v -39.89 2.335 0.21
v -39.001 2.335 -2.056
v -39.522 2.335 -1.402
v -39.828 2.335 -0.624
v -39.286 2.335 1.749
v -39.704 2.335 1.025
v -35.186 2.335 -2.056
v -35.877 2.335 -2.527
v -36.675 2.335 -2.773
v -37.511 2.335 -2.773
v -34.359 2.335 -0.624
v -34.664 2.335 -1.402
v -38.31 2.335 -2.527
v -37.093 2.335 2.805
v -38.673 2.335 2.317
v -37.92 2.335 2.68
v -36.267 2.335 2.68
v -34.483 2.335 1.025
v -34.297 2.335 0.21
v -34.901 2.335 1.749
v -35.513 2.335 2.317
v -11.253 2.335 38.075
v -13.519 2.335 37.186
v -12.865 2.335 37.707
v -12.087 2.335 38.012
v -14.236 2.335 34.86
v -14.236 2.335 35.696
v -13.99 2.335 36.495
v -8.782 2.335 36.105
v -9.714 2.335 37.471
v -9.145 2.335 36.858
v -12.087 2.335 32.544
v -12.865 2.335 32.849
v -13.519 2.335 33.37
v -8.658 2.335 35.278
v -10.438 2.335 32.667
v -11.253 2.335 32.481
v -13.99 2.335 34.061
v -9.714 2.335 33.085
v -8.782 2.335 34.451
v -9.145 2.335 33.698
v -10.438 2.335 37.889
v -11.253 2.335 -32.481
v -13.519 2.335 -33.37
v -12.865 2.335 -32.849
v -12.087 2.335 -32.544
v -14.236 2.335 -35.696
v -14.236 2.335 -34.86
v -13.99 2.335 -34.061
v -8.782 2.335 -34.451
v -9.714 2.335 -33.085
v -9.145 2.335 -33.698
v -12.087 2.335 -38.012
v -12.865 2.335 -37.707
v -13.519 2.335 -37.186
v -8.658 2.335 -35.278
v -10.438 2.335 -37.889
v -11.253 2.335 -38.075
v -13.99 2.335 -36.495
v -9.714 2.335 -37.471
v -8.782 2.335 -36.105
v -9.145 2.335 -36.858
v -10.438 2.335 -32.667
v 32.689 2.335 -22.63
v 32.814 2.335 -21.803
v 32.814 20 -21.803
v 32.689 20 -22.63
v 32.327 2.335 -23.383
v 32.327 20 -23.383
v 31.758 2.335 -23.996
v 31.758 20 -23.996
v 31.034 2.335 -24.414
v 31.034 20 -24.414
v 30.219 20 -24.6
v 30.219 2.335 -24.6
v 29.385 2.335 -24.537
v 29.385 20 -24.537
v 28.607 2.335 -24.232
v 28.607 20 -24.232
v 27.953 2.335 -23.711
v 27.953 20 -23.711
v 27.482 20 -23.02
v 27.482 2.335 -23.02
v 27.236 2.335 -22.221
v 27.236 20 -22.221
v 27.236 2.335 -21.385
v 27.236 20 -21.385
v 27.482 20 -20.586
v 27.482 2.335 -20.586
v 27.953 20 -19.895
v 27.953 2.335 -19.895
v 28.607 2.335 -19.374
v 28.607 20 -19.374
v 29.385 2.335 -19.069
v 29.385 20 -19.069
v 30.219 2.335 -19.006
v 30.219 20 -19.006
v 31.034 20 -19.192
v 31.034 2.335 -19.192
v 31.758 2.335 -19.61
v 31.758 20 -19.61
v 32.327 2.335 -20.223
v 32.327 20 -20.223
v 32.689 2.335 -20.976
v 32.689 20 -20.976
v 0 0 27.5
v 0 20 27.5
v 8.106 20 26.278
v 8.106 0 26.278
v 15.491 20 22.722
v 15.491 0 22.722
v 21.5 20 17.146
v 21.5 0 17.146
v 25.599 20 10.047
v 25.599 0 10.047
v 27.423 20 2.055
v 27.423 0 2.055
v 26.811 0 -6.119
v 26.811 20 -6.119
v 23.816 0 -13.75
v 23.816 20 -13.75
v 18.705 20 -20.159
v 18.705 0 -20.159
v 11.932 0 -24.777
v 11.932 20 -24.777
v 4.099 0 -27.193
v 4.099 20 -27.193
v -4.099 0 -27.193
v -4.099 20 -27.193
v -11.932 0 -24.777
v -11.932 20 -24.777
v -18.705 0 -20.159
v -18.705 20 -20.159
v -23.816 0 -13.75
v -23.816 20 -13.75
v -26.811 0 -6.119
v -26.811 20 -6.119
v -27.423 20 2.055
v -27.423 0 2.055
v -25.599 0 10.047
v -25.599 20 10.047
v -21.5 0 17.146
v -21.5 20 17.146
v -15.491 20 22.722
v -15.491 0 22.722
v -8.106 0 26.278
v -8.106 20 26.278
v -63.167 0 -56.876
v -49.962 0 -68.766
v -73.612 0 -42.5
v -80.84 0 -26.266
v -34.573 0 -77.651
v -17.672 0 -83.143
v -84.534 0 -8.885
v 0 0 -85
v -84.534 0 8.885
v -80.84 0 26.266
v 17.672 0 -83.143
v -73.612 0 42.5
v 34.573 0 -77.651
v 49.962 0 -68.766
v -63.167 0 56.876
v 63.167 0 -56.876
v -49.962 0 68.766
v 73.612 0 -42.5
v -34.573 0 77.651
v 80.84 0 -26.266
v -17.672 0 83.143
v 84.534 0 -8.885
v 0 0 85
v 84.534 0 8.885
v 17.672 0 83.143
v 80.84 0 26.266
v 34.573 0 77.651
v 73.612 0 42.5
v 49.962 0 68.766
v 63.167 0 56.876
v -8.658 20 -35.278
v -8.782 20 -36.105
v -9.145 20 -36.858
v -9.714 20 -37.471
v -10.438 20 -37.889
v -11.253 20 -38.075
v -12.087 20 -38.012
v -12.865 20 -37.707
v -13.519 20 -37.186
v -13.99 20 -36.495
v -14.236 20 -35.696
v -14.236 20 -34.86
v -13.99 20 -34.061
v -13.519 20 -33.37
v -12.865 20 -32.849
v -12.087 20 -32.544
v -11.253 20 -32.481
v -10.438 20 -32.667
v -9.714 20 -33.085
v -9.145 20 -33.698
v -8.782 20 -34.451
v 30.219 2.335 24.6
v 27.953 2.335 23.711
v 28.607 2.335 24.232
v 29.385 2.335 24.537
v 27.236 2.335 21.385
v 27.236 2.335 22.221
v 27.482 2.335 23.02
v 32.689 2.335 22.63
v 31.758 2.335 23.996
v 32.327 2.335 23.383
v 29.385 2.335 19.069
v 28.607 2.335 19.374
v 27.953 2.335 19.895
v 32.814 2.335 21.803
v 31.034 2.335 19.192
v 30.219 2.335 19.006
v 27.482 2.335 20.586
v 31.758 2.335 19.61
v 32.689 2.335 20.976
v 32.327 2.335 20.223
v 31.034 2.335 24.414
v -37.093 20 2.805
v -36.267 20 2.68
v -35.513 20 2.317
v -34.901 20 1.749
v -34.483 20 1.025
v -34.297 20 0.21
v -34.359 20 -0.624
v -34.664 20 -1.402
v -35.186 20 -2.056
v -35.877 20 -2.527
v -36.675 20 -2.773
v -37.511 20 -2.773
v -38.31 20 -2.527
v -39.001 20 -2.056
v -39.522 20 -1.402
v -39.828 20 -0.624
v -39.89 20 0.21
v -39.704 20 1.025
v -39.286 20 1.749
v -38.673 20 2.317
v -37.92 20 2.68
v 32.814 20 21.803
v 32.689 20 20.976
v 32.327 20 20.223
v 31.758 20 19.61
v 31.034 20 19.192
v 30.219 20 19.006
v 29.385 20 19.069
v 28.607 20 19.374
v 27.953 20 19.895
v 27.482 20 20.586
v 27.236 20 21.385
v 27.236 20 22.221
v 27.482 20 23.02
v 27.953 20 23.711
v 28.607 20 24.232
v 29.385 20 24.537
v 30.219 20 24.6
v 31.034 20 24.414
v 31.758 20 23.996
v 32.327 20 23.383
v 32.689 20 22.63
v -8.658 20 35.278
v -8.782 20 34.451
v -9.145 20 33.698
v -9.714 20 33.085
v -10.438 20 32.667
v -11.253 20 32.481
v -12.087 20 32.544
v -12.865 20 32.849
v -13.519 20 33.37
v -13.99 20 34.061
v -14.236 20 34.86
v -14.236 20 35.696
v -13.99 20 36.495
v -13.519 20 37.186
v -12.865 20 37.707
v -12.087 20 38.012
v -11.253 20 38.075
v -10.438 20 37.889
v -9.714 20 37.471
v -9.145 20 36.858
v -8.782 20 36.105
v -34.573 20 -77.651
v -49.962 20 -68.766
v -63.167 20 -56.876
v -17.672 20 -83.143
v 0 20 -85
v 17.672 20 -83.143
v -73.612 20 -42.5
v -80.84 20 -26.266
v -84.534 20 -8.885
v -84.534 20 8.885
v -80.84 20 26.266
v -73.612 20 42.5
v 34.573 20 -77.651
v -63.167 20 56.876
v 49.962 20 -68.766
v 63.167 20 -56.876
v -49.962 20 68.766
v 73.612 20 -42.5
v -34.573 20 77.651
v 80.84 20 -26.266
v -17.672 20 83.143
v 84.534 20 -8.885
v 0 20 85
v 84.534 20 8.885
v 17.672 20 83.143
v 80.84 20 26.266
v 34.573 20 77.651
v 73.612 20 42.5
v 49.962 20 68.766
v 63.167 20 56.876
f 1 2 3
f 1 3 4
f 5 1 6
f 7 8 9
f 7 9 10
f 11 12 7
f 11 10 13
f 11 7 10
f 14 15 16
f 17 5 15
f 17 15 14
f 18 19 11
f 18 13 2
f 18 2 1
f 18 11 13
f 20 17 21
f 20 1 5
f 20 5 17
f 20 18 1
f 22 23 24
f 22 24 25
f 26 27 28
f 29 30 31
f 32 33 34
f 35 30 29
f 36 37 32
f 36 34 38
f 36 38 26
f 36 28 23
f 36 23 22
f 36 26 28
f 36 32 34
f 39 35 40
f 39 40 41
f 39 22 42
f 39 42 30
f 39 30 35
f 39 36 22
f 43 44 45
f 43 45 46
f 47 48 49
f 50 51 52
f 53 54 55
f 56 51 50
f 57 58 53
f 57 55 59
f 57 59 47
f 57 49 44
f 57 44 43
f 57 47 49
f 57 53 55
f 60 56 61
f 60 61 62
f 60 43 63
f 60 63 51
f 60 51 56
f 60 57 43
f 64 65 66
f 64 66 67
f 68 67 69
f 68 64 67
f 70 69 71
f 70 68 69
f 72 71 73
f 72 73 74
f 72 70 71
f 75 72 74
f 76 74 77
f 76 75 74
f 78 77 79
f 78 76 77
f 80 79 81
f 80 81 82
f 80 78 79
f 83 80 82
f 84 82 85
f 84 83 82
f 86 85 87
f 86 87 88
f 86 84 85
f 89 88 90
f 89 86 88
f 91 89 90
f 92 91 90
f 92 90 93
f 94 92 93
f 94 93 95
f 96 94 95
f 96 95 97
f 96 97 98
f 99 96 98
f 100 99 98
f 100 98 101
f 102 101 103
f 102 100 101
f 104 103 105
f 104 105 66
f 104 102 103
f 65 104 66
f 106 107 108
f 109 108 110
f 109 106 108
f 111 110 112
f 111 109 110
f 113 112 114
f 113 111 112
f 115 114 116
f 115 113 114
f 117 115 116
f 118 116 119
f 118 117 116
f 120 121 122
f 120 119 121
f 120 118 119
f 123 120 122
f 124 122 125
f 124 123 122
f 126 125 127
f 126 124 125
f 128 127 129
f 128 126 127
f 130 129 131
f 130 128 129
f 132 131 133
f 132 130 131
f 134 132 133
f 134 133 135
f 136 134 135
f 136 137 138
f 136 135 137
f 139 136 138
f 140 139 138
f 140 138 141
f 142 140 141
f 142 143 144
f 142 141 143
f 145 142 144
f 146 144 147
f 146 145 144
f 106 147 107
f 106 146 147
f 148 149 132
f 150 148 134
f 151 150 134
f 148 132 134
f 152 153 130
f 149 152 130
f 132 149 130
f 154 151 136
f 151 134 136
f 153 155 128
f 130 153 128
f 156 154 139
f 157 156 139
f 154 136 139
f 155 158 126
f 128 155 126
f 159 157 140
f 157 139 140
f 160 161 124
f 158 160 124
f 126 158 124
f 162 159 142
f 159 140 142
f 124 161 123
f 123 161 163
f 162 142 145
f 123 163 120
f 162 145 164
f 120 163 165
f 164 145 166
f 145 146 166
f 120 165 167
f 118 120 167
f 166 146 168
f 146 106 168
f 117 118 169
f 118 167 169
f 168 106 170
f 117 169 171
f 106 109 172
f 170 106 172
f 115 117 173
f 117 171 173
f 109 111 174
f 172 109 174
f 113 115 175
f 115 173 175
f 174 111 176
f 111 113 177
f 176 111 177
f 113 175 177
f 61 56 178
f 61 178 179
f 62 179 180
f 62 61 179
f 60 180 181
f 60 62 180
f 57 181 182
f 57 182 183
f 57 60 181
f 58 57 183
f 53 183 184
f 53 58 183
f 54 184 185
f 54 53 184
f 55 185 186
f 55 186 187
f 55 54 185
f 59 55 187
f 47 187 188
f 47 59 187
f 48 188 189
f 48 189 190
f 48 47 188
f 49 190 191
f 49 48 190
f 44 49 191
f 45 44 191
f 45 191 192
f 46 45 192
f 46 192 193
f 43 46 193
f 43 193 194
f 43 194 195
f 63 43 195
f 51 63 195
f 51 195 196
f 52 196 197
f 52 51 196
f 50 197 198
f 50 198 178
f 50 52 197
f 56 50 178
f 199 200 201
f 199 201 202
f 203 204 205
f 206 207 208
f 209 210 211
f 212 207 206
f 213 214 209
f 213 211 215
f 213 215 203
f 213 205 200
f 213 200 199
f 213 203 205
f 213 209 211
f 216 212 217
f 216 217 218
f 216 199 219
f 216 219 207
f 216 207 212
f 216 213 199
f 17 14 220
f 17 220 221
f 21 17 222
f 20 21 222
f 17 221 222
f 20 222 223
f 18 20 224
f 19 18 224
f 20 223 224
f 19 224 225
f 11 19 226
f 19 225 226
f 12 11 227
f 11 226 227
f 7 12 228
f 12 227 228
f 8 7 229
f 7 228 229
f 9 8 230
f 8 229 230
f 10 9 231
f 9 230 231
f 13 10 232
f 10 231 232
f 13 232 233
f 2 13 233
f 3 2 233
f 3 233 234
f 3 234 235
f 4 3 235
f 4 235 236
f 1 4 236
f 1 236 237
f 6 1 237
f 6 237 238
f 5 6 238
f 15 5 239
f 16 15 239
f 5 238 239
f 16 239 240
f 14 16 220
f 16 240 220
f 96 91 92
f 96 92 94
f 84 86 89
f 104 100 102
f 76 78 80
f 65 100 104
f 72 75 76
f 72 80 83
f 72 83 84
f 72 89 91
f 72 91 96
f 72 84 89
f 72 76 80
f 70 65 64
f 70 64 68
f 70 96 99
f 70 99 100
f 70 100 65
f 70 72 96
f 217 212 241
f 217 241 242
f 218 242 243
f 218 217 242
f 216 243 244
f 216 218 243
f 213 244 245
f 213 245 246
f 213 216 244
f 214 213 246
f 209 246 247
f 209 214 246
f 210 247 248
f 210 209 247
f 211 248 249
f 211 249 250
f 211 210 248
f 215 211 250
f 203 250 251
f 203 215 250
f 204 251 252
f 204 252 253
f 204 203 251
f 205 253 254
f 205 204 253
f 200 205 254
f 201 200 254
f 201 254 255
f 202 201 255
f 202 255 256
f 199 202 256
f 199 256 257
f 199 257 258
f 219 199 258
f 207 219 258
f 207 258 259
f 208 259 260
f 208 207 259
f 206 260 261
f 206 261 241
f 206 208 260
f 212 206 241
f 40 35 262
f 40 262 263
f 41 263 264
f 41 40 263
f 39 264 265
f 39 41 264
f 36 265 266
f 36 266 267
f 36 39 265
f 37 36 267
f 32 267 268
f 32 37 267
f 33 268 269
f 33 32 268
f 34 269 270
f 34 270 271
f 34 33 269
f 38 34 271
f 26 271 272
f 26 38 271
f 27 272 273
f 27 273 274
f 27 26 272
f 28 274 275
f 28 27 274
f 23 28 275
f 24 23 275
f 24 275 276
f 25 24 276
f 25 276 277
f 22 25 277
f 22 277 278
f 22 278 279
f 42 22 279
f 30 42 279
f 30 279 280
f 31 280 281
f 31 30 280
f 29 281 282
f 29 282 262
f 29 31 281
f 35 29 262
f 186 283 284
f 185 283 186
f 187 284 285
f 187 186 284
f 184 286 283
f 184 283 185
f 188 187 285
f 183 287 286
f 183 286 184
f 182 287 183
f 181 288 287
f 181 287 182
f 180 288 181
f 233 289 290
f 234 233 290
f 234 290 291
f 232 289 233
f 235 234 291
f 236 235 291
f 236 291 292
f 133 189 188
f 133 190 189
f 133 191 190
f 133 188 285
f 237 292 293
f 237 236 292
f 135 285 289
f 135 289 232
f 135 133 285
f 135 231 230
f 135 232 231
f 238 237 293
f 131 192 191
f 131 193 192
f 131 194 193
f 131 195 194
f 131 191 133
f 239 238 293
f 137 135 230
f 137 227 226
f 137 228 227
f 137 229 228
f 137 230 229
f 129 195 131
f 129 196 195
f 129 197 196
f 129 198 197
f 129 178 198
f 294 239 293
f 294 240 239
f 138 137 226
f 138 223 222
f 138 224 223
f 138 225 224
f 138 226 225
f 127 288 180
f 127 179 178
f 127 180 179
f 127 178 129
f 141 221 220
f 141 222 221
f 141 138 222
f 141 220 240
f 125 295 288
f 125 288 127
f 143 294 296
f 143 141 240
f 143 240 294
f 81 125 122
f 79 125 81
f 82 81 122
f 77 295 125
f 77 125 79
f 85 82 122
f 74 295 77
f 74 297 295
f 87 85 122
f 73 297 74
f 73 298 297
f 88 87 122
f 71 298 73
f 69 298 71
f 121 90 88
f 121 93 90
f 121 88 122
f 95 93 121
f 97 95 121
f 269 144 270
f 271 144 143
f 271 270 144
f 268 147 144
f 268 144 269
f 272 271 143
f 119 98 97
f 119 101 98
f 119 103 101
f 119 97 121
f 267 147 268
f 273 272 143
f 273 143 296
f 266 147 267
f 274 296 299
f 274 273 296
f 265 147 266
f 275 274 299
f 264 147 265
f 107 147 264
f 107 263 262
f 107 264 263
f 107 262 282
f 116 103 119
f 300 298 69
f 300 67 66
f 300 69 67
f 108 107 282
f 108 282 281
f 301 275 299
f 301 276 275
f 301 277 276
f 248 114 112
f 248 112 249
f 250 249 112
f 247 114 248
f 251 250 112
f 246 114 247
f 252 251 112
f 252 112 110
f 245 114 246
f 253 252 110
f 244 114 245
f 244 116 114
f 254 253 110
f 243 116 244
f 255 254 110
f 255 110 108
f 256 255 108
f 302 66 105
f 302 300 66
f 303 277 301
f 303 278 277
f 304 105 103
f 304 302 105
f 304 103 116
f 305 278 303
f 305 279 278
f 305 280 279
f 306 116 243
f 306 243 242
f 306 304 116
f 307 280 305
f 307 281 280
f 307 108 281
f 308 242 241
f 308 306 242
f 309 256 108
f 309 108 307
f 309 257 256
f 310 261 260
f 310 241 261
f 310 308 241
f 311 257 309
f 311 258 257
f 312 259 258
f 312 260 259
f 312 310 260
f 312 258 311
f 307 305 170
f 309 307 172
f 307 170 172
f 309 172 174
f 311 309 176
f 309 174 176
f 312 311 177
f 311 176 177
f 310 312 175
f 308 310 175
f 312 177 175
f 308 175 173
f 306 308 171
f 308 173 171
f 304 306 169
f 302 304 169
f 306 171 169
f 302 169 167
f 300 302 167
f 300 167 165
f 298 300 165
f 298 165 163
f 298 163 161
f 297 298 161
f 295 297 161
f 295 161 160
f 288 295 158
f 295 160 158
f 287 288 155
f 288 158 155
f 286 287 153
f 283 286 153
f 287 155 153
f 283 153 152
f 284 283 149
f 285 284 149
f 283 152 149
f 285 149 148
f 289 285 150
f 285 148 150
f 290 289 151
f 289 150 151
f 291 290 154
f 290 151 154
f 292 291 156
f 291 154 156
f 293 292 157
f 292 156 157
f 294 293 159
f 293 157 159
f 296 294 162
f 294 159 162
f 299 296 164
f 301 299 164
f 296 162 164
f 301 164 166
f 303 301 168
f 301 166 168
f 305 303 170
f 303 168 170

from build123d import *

# Parameters (mm, degrees)
SKETCH1_R           = 85
BOSS_EXTRUDE1_DEPTH = 20
SKETCH2_R           = 27.5
CUT_EXTRUDE1_DEPTH  = 122.86057607
SKETCH3_R           = 2.80475321
CUT_EXTRUDE2_DEPTH  = 17.664904326
CIRPATTERN1_COUNT   = 5


with BuildPart() as part:
    # Sketch1 → Boss-Extrude1 (new body)
    with BuildSketch(Plane(origin=(0, 0, 0), x_dir=(1, 0, 0), z_dir=(0, 1, 0))):
        Circle(SKETCH1_R)
    extrude(amount=BOSS_EXTRUDE1_DEPTH)

    # Sketch2 → Cut-Extrude1 (cut, through all)
    with BuildSketch(Plane(origin=(0, 0, 0), x_dir=(1, 0, 0), z_dir=(0, 1, 0))):
        Circle(SKETCH2_R)
    extrude(amount=CUT_EXTRUDE1_DEPTH, mode=Mode.SUBTRACT)

    # Sketch3 → Cut-Extrude2 (cut)
    with BuildSketch(Plane(origin=(0, 20, 0), x_dir=(1, 0, 0), z_dir=(0, 1, 0))):
        with Locations((-37.09345141, 0)):
            Circle(SKETCH3_R)
    cut_extrude2 = extrude(amount=-CUT_EXTRUDE2_DEPTH, mode=Mode.SUBTRACT)

    # CirPattern1: Cut-Extrude2 ×5 about axis
    cirpattern1_axis = Axis((0, 0, 0), (0, 1, 0))
    for i in range(1, CIRPATTERN1_COUNT):
        add(cut_extrude2.rotate(cirpattern1_axis, i * 360 / CIRPATTERN1_COUNT), mode=Mode.SUBTRACT)


solid = part.part
